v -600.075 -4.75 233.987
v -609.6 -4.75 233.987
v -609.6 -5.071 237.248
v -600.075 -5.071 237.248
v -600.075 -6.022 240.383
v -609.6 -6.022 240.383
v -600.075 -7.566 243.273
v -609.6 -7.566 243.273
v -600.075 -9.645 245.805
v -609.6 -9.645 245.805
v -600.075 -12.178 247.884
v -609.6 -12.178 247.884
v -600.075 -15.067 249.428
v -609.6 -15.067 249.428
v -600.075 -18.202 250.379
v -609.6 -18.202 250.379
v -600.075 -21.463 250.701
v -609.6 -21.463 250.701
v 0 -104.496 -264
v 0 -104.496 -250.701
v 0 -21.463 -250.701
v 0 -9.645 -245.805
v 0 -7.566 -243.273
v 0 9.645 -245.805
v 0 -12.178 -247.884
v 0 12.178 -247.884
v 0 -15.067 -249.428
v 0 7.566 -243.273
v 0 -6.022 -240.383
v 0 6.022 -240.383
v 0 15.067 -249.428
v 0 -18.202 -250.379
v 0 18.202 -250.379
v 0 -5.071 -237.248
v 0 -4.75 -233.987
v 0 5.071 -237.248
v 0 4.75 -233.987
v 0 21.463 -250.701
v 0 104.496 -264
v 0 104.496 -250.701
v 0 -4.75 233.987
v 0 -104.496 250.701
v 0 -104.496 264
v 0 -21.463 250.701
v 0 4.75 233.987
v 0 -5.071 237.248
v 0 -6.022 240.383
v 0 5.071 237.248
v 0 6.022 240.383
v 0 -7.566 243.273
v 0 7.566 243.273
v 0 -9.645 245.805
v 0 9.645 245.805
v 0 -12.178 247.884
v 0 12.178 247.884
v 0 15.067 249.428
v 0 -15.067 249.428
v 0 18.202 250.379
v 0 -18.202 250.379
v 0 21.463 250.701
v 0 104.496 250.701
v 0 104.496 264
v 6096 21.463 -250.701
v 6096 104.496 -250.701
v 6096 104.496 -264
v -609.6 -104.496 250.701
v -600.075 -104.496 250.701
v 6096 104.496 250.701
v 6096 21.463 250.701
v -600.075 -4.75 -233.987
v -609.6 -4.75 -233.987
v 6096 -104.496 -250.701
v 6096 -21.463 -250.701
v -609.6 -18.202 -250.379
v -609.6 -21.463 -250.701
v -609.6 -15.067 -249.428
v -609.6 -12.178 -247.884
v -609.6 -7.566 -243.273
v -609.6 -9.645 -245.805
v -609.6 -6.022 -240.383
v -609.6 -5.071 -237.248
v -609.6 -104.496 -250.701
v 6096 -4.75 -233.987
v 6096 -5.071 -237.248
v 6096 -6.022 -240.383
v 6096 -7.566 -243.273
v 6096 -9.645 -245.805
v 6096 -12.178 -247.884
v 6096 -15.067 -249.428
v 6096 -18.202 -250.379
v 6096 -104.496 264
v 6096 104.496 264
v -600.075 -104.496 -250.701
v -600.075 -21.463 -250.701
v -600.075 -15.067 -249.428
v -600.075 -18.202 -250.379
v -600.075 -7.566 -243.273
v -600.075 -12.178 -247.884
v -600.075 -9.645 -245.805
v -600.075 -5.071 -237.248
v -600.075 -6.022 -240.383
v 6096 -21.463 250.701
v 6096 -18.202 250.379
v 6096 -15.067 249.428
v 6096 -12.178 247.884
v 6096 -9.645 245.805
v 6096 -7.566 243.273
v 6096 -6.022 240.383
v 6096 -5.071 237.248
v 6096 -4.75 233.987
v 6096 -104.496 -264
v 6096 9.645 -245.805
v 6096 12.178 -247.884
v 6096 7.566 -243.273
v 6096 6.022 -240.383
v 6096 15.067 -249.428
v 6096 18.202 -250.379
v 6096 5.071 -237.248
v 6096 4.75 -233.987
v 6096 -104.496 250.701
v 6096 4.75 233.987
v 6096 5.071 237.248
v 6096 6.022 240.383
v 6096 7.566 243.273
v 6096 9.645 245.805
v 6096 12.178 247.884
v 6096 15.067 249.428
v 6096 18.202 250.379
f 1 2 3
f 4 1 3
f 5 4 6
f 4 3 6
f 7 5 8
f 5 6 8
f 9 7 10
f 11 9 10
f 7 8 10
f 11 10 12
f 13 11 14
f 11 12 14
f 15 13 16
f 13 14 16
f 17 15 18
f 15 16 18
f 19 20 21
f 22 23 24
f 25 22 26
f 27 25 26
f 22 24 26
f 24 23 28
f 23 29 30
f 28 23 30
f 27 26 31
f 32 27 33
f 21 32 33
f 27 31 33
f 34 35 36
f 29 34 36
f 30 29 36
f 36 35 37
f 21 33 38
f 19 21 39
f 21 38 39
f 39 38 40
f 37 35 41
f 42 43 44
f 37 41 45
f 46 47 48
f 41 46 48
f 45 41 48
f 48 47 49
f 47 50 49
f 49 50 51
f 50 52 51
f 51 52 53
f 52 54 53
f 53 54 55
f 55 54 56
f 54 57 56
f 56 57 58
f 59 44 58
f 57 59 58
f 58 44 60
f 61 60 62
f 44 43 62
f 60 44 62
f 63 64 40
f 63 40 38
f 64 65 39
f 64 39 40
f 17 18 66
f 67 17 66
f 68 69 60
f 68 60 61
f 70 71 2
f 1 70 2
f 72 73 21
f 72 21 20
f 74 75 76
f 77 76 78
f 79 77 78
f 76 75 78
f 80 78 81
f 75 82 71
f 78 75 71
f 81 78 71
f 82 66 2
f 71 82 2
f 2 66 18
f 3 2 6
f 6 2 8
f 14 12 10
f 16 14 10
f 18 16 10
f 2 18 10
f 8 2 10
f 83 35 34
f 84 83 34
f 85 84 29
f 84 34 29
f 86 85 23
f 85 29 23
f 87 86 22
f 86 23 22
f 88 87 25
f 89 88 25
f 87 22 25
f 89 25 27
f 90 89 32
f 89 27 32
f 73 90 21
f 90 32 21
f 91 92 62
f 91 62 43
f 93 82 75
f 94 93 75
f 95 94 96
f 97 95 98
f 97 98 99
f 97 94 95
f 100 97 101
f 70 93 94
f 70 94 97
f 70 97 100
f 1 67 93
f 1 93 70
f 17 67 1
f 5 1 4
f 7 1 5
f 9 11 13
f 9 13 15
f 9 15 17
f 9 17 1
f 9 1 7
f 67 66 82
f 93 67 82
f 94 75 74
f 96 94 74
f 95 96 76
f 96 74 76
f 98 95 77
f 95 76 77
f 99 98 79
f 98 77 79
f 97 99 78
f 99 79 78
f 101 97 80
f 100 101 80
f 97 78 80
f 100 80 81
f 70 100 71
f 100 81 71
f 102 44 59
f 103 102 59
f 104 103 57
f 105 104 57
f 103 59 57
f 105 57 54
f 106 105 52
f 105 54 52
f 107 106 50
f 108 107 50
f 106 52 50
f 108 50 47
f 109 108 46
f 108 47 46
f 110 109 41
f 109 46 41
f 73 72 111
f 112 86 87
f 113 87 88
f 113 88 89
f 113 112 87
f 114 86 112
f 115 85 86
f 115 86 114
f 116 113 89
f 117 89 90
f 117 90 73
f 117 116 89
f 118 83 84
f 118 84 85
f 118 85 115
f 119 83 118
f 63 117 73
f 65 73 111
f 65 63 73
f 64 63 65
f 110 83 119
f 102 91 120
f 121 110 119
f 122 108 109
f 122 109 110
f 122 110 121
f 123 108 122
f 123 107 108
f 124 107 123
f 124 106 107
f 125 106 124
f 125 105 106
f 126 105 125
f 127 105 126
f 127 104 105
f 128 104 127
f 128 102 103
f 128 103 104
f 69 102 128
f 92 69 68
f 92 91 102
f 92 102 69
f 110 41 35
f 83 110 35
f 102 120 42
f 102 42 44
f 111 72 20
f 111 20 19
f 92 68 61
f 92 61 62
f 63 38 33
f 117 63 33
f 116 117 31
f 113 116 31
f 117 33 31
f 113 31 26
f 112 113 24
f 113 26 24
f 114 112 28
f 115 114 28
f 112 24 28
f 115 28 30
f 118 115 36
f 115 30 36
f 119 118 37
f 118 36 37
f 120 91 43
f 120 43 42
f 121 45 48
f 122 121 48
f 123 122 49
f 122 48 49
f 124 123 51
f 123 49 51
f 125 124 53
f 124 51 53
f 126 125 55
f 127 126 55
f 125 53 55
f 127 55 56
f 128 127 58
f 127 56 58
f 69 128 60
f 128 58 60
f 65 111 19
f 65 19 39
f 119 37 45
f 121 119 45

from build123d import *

# Parameters (mm, degrees)
F1_DEPTH = 6096
F4_DEPTH = 9.525


with BuildPart() as f1:
    # F0 (on Right) → F1 (new body)
    with BuildSketch(Plane.YZ):
        with BuildLine():
            Line((-4.7498, 233.98734), (-4.7498, 0))
            Line((-4.7498, 0), (-4.7498, -233.98734))
            ThreePointArc((-4.7498, -233.98734), (-9.644983, -245.805357), (-21.463, -250.70054))
            Line((-21.463, -250.70054), (-104.4956, -250.70054))
            Line((-104.4956, -250.70054), (-104.4956, -263.99998))
            Line((-104.4956, -263.99998), (0, -263.99998))
            Line((0, -263.99998), (104.4956, -263.99998))
            Line((104.4956, -263.99998), (104.4956, -250.70054))
            Line((104.4956, -250.70054), (21.463, -250.70054))
            ThreePointArc((21.463, -250.70054), (9.644983, -245.805357), (4.7498, -233.98734))
            Line((4.7498, -233.98734), (4.7498, 0))
            Line((4.7498, 0), (4.7498, 233.98734))
            ThreePointArc((4.7498, 233.98734), (9.644983, 245.805357), (21.463, 250.70054))
            Line((21.463, 250.70054), (104.4956, 250.70054))
            Line((104.4956, 250.70054), (104.4956, 263.99998))
            Line((104.4956, 263.99998), (0, 263.99998))
            Line((0, 263.99998), (-104.4956, 263.99998))
            Line((-104.4956, 263.99998), (-104.4956, 250.70054))
            Line((-104.4956, 250.70054), (-21.463, 250.70054))
            ThreePointArc((-21.463, 250.70054), (-9.644983, 245.805357), (-4.7498, 233.98734))
        make_face()
    extrude(amount=F1_DEPTH)


with BuildPart() as f4:
    # F3 (on offset) → F4 (new body)
    with BuildSketch(Plane.YZ.offset(-609.6)):
        with BuildLine():
            ThreePointArc((-4.7498, 233.98734), (-9.644983, 245.805357), (-21.463, 250.70054))
            Line((-21.463, 250.70054), (-104.4956, 250.70054))
            Line((-104.4956, 250.70054), (-104.4956, -250.70054))
            Line((-104.4956, -250.70054), (-21.463, -250.70054))
            ThreePointArc((-21.463, -250.70054), (-9.644983, -245.805357), (-4.7498, -233.98734))
            Line((-4.7498, -233.98734), (-4.7498, 233.98734))
        make_face()
    extrude(amount=F4_DEPTH)


solid = Compound([f1.part, f4.part])
